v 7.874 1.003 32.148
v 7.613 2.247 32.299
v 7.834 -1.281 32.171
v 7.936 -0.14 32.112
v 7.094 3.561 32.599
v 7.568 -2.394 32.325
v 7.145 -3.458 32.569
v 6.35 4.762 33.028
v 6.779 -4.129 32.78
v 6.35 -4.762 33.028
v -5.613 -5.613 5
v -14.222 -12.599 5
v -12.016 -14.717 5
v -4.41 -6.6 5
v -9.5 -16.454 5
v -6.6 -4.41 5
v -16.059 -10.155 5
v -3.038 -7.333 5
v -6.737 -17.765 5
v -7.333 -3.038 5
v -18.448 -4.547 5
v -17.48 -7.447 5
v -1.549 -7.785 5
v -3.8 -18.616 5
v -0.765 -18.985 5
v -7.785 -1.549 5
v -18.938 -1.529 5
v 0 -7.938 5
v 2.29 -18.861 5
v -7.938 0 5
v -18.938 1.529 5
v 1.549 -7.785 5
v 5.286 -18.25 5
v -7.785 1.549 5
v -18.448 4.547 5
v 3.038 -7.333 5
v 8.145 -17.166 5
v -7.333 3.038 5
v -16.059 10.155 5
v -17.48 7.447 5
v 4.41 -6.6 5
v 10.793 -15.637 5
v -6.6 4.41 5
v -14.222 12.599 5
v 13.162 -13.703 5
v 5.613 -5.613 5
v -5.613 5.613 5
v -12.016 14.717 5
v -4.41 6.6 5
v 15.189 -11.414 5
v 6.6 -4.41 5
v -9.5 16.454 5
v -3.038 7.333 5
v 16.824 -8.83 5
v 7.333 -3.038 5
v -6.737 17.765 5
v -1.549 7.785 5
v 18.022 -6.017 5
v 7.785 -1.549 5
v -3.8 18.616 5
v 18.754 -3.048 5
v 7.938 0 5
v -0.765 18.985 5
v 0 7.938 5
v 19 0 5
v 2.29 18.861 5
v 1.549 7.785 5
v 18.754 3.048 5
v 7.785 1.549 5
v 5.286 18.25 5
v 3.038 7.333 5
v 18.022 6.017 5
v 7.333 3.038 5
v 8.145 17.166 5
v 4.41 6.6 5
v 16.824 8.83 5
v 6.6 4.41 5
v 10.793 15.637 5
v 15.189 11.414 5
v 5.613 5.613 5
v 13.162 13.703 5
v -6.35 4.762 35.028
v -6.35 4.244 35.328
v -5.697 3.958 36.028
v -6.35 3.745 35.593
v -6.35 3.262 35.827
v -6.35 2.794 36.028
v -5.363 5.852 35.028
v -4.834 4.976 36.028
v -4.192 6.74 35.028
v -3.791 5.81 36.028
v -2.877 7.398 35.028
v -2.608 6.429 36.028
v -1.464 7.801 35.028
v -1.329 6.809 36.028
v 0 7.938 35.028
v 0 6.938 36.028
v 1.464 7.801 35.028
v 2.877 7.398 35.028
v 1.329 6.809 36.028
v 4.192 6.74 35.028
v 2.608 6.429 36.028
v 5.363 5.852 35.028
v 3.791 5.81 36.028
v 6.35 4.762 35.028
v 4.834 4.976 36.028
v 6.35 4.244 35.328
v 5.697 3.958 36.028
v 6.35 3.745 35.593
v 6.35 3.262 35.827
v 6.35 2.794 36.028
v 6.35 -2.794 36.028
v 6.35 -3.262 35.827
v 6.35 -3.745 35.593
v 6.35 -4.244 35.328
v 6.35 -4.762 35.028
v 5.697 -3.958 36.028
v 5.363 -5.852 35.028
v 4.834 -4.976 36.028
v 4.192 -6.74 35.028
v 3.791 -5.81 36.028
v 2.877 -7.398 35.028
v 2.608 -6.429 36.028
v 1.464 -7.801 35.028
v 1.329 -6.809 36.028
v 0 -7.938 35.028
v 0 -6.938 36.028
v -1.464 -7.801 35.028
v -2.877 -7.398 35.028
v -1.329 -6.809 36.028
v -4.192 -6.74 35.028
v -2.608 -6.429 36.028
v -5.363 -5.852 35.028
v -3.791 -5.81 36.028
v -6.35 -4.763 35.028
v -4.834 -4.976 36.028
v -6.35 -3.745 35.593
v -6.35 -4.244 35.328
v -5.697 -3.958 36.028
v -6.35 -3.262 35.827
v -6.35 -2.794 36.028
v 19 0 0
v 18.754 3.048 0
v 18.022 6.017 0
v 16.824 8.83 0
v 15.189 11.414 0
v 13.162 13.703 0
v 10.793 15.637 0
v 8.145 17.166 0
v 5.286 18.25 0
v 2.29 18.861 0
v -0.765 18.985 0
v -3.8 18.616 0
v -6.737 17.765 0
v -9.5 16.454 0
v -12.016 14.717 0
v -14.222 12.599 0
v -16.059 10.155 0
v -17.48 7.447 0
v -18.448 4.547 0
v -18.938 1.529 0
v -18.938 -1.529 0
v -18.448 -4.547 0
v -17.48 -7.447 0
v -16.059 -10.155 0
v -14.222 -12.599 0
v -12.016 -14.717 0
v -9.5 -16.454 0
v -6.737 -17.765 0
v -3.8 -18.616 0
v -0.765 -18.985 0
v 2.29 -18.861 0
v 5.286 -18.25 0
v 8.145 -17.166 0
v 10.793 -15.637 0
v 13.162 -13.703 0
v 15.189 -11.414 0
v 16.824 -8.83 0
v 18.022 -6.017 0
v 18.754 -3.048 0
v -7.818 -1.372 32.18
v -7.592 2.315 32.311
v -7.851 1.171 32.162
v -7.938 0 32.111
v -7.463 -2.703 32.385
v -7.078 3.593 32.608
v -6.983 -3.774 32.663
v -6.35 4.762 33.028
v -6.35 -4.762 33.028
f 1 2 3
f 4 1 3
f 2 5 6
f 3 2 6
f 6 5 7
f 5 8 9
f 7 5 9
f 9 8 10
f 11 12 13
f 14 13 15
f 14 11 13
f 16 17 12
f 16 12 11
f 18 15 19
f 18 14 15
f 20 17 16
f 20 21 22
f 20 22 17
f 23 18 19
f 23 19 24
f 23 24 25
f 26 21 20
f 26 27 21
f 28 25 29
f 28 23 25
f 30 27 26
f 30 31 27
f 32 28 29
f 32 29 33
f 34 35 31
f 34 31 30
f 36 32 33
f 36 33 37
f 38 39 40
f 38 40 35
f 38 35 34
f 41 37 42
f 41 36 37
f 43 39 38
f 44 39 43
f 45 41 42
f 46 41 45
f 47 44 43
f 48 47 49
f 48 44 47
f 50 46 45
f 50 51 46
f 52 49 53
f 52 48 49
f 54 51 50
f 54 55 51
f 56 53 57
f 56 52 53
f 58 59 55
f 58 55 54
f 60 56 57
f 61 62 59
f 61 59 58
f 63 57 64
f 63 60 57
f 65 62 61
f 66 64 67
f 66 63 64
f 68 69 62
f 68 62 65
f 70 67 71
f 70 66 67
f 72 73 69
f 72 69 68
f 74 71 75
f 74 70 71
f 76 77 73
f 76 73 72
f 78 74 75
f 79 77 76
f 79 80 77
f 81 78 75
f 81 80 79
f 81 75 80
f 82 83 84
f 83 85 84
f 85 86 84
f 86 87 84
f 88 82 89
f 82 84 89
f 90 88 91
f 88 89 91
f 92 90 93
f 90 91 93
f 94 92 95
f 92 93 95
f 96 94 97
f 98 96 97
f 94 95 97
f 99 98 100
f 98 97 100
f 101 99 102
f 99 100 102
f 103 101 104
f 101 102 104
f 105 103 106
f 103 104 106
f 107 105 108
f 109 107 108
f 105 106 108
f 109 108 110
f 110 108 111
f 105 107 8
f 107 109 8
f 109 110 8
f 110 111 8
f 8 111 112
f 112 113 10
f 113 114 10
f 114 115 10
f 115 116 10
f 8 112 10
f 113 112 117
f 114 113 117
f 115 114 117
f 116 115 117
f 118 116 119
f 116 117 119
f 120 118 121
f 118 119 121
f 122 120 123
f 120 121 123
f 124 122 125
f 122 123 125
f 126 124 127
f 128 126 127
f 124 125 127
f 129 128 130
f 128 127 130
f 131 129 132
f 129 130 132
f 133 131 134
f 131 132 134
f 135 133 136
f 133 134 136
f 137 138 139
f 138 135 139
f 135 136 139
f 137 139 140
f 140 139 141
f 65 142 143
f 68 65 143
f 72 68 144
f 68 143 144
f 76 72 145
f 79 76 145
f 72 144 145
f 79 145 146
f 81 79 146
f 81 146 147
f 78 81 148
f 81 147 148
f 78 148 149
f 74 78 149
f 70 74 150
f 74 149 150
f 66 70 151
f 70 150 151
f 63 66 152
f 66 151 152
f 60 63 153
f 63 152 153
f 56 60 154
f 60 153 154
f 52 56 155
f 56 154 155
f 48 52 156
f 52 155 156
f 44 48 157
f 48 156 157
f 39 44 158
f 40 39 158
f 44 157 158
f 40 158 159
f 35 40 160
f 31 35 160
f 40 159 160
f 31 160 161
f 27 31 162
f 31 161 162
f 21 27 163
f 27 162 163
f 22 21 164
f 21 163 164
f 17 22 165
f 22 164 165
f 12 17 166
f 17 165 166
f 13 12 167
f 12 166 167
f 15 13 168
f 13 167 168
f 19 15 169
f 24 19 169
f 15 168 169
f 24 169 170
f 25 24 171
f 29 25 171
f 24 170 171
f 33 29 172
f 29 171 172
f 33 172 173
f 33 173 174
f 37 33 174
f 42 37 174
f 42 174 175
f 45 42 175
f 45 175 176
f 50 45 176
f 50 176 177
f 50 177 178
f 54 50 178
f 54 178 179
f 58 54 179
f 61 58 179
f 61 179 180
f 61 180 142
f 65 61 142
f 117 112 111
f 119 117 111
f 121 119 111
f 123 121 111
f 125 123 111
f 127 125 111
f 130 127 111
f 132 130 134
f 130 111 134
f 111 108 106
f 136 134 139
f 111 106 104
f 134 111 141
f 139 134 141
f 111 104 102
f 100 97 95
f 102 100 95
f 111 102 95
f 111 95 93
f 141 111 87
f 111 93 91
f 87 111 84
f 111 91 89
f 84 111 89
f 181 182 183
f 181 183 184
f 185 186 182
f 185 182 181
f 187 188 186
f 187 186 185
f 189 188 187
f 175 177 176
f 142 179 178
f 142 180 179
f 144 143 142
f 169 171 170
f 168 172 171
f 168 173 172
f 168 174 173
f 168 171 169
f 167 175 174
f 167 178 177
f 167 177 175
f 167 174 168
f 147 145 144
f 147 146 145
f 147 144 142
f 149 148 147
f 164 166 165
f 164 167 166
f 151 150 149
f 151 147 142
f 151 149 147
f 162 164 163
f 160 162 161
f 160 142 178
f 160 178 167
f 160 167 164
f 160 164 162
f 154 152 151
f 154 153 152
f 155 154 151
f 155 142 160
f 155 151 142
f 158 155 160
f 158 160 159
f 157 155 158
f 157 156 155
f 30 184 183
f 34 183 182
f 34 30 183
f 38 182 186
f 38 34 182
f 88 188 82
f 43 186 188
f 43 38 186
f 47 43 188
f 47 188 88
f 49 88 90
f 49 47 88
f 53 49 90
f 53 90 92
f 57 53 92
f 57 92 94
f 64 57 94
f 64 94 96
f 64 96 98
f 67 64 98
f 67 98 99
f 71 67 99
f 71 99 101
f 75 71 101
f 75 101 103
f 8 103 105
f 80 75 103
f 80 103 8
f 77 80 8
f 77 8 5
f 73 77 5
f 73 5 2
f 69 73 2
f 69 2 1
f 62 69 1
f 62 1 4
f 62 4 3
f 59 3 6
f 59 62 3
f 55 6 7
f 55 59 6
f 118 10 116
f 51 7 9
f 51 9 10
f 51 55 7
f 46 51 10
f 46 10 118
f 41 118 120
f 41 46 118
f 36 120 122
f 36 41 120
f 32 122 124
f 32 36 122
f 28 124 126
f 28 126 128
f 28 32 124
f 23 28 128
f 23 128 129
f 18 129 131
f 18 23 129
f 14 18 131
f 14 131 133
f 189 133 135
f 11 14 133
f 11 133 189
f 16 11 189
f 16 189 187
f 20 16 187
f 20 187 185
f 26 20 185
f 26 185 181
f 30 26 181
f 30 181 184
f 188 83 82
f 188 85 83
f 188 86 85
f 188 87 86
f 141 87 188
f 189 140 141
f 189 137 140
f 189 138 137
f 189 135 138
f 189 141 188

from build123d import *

# Parameters (mm, degrees)
SKETCH1_R               = 19
PISTON_DEPTH            = 5
SKETCH2_R               = 7.9375
ROD_DEPTH               = 36.028
ROD_END_CHAMFER_SIZE    = 1
WRENCH_FLATS_DEPTH      = 45.944596828
WRENCH_FLATS_DEPTH_BACK = 45.944596828


with BuildPart() as part:
    # Sketch1 → Piston (new body)
    with BuildSketch(Plane.XY):
        Circle(SKETCH1_R)
    extrude(amount=PISTON_DEPTH)

    # Sketch2 → Rod (add)
    with BuildSketch(Plane(origin=(0, 0, 0), x_dir=(-1, 0, 0), z_dir=(0, 0, -1))):
        Circle(SKETCH2_R)
    extrude(amount=-ROD_DEPTH)

    # Rod End Chamfer
    rod_end_chamfer_edges = [part.edges().sort_by_distance(p)[0] for p in [
        (7.9375, 0, 36.028),
    ]]
    chamfer(rod_end_chamfer_edges, length=ROD_END_CHAMFER_SIZE)

    # Sketch11 → Wrench Flats (cut, two sides: drawn at the far end of the back side and taken through both)
    with BuildSketch(Plane(origin=(0, 0, 0), x_dir=(1, 0, 0), z_dir=(0, 1, 0)).offset(-WRENCH_FLATS_DEPTH_BACK)):
        Polygon((-6.35, -36.028), (-6.35, -33.028), (-11.35, -30.141248654), (-11.35, -36.028), align=None)
        Polygon((6.35, -36.028), (6.35, -33.028), (11.35, -30.141248654), (11.35, -36.028), align=None)
    extrude(amount=WRENCH_FLATS_DEPTH + WRENCH_FLATS_DEPTH_BACK, mode=Mode.SUBTRACT)


solid = part.part
